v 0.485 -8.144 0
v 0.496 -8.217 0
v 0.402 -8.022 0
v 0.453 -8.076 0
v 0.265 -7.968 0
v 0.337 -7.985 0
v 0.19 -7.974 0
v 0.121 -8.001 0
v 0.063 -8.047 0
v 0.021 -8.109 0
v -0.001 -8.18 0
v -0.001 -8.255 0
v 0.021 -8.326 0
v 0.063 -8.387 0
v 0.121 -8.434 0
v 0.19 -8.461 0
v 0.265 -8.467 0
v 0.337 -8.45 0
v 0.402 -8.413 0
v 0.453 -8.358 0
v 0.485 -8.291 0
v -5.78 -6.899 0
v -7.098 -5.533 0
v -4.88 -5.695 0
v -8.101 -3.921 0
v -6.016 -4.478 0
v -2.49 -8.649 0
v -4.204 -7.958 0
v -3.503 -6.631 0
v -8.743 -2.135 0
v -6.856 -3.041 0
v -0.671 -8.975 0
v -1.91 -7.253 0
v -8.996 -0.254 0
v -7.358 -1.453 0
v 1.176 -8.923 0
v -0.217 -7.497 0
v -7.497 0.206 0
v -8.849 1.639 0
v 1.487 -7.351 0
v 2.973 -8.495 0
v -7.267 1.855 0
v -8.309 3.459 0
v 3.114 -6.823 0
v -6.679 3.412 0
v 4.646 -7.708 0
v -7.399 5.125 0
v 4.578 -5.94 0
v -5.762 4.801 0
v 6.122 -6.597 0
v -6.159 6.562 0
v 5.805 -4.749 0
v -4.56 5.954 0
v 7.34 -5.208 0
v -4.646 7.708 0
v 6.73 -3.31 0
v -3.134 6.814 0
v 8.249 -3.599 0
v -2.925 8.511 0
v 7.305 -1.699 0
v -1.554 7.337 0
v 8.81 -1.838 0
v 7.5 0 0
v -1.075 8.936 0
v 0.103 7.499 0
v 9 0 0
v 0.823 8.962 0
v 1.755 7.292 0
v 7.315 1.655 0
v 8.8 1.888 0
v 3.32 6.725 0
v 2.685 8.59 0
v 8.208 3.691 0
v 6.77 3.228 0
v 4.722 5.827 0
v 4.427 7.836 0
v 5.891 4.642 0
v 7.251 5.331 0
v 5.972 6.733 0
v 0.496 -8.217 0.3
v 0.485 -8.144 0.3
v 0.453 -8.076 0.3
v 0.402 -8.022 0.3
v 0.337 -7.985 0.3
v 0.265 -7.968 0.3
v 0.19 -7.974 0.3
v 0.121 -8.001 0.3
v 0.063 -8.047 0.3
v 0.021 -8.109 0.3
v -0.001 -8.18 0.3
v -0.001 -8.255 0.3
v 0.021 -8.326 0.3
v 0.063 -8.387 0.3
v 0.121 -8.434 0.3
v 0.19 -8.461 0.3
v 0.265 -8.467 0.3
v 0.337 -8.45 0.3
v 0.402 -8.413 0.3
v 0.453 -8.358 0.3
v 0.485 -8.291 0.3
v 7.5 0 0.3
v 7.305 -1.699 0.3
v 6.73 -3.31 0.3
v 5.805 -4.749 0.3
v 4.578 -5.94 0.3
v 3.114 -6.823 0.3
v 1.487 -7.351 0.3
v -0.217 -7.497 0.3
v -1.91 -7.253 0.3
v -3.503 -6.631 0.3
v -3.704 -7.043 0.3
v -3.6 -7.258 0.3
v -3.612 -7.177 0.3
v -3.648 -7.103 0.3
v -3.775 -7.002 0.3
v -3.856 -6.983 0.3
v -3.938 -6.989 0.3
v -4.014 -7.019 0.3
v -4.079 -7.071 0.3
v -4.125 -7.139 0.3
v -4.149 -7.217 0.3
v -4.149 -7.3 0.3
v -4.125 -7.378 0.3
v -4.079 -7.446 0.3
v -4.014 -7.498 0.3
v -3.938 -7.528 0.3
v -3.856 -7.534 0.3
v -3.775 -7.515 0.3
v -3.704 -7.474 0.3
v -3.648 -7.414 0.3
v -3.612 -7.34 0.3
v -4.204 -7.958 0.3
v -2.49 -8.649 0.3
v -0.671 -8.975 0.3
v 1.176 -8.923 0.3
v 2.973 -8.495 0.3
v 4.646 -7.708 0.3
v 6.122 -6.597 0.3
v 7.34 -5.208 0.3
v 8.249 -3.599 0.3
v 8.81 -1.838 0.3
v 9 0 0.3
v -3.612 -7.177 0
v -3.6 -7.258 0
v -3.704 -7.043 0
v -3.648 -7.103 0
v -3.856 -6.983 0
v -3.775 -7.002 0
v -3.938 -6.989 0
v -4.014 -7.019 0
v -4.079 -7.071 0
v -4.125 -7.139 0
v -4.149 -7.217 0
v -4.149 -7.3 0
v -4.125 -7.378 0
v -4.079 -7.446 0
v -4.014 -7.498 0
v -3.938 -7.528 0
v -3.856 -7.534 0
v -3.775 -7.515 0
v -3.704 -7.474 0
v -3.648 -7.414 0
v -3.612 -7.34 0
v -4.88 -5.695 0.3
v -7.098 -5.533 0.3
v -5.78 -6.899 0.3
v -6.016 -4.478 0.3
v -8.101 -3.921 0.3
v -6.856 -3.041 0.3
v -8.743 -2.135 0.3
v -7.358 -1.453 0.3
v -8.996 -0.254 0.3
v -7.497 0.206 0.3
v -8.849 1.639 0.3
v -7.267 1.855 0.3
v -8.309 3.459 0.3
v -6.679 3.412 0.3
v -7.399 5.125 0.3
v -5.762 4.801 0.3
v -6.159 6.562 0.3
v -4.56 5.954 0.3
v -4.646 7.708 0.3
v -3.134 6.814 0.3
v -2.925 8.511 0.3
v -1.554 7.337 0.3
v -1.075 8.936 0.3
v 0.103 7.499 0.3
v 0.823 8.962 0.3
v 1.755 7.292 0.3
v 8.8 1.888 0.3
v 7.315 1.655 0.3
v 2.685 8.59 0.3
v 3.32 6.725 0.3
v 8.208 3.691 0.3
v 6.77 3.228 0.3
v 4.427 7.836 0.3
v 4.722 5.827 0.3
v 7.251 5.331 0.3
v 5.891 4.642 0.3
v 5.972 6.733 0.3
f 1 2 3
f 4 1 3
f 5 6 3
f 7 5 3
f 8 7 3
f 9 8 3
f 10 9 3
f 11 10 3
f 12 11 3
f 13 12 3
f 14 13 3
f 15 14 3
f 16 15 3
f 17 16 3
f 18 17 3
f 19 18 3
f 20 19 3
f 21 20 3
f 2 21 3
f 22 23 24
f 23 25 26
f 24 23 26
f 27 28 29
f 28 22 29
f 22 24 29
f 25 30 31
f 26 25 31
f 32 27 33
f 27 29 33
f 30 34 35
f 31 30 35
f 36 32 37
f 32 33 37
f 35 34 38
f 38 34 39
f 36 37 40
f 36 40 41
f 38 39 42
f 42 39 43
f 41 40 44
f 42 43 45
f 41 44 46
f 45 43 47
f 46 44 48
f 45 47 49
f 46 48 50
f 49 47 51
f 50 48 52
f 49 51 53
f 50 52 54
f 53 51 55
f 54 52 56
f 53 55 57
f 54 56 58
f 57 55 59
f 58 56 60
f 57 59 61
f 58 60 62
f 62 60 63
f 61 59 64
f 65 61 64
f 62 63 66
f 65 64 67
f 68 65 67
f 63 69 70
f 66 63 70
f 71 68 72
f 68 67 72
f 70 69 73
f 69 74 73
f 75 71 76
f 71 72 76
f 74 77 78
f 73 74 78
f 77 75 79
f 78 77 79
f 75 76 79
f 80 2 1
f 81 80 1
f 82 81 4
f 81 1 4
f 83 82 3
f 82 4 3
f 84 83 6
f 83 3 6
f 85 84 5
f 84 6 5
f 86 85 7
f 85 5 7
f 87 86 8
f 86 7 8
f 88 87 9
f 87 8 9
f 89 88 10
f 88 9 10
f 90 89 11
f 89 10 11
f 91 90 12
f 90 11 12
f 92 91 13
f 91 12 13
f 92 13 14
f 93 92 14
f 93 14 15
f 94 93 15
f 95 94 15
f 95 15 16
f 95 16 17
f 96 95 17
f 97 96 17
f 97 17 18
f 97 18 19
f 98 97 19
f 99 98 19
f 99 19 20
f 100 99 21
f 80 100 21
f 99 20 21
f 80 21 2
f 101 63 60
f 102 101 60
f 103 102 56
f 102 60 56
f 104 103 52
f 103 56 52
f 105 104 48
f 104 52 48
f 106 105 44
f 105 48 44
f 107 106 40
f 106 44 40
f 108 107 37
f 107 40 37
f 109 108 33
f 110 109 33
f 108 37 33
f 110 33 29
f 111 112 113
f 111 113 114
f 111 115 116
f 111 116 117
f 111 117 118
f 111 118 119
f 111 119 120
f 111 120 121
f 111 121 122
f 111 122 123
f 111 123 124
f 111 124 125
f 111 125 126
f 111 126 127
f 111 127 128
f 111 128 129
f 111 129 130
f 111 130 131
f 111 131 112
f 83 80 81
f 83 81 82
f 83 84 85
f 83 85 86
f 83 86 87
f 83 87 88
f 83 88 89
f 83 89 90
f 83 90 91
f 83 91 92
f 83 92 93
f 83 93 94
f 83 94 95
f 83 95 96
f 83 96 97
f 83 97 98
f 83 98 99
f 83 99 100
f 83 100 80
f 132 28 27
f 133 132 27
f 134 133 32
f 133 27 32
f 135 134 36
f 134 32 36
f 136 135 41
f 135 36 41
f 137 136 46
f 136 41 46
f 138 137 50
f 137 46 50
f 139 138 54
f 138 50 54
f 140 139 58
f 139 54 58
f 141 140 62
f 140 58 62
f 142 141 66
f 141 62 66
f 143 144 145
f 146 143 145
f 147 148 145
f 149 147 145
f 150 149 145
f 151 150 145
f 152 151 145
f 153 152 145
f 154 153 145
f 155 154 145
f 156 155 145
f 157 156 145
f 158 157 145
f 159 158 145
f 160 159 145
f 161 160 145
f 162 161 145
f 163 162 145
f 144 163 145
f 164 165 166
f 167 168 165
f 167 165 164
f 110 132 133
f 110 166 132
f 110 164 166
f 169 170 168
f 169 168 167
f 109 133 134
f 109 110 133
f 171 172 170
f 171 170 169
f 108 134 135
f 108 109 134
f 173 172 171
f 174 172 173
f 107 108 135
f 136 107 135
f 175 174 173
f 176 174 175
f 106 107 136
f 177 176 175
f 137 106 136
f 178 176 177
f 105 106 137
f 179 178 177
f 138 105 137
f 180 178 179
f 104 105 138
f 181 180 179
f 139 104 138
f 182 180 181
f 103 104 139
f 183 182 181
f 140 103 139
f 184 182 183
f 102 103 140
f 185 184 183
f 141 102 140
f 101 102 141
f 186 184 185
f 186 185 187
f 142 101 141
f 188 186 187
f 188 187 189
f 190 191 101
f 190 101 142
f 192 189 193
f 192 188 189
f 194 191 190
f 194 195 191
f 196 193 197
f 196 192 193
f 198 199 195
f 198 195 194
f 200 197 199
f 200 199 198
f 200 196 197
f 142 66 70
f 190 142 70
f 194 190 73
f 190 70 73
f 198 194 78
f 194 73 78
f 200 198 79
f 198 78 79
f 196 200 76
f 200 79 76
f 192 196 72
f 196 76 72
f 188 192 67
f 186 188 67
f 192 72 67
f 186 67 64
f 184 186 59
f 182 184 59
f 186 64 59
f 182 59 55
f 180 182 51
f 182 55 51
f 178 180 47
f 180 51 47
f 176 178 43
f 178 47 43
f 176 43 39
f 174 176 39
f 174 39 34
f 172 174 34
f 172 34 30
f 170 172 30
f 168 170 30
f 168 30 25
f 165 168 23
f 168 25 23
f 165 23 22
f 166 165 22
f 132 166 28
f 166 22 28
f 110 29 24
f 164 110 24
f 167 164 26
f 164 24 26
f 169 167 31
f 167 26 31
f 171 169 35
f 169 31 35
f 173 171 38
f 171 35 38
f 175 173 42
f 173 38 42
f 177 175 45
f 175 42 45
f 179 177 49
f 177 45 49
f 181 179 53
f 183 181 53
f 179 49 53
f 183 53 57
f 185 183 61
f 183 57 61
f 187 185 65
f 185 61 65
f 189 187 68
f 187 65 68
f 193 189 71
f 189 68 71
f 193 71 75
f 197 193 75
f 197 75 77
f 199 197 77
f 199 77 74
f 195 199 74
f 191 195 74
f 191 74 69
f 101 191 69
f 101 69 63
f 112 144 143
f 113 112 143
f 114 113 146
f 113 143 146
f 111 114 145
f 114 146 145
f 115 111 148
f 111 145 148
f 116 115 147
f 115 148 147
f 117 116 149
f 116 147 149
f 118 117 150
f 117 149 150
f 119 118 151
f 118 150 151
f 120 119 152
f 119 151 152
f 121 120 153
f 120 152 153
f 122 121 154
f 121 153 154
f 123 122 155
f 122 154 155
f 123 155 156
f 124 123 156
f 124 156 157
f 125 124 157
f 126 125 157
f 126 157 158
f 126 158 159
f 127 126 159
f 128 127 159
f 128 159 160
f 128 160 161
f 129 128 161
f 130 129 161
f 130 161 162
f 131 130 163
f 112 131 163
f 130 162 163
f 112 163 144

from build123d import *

# Parameters (mm, degrees)
F1_R     = 0.276
F2_DEPTH = 0.3
F1_R_2   = 0.25


# Not quite as in the source:
# - a feature of the source that left no trace in its solid (it failed there, or was rolled back) is left out


with BuildPart() as f2:
    # F1 (on face) → F2 (new body)
    with BuildSketch(Plane.XY):
        with Locations((-3.8761778269, -7.2584804147)):
            Circle(F1_R)
    extrude(amount=F2_DEPTH)


with BuildPart() as f2b:
    # F1 (on face) → F2, piece 2 (new body)
    with BuildSketch(Plane.XY):
        with Locations((0.2459411263, -8.2172408689)):
            Circle(F1_R_2)
    extrude(amount=F2_DEPTH)


with BuildPart() as f2c:
    # F0 (on Top) → F2, piece 3 (new body)
    with BuildSketch(Plane.XY):
        with BuildLine():
            ThreePointArc((-4.2041171366, -7.9577257494), (4.6455863877, -7.7083413984), (9, 0))
            ThreePointArc((9, 0), (-4.6455863877, 7.7083413984), (-4.2041171366, -7.9577257494))
        make_face()
        with BuildLine():
            ThreePointArc((7.5, 0), (3.8713219897, -6.423617832), (-3.5034309471, -6.6314381245))
            ThreePointArc((-3.5034309471, -6.6314381245), (-3.8713219897, 6.423617832), (7.5, 0))
        make_face(mode=Mode.SUBTRACT)
    extrude(amount=F2_DEPTH)


solid = Compound([f2.part, f2b.part, f2c.part])
